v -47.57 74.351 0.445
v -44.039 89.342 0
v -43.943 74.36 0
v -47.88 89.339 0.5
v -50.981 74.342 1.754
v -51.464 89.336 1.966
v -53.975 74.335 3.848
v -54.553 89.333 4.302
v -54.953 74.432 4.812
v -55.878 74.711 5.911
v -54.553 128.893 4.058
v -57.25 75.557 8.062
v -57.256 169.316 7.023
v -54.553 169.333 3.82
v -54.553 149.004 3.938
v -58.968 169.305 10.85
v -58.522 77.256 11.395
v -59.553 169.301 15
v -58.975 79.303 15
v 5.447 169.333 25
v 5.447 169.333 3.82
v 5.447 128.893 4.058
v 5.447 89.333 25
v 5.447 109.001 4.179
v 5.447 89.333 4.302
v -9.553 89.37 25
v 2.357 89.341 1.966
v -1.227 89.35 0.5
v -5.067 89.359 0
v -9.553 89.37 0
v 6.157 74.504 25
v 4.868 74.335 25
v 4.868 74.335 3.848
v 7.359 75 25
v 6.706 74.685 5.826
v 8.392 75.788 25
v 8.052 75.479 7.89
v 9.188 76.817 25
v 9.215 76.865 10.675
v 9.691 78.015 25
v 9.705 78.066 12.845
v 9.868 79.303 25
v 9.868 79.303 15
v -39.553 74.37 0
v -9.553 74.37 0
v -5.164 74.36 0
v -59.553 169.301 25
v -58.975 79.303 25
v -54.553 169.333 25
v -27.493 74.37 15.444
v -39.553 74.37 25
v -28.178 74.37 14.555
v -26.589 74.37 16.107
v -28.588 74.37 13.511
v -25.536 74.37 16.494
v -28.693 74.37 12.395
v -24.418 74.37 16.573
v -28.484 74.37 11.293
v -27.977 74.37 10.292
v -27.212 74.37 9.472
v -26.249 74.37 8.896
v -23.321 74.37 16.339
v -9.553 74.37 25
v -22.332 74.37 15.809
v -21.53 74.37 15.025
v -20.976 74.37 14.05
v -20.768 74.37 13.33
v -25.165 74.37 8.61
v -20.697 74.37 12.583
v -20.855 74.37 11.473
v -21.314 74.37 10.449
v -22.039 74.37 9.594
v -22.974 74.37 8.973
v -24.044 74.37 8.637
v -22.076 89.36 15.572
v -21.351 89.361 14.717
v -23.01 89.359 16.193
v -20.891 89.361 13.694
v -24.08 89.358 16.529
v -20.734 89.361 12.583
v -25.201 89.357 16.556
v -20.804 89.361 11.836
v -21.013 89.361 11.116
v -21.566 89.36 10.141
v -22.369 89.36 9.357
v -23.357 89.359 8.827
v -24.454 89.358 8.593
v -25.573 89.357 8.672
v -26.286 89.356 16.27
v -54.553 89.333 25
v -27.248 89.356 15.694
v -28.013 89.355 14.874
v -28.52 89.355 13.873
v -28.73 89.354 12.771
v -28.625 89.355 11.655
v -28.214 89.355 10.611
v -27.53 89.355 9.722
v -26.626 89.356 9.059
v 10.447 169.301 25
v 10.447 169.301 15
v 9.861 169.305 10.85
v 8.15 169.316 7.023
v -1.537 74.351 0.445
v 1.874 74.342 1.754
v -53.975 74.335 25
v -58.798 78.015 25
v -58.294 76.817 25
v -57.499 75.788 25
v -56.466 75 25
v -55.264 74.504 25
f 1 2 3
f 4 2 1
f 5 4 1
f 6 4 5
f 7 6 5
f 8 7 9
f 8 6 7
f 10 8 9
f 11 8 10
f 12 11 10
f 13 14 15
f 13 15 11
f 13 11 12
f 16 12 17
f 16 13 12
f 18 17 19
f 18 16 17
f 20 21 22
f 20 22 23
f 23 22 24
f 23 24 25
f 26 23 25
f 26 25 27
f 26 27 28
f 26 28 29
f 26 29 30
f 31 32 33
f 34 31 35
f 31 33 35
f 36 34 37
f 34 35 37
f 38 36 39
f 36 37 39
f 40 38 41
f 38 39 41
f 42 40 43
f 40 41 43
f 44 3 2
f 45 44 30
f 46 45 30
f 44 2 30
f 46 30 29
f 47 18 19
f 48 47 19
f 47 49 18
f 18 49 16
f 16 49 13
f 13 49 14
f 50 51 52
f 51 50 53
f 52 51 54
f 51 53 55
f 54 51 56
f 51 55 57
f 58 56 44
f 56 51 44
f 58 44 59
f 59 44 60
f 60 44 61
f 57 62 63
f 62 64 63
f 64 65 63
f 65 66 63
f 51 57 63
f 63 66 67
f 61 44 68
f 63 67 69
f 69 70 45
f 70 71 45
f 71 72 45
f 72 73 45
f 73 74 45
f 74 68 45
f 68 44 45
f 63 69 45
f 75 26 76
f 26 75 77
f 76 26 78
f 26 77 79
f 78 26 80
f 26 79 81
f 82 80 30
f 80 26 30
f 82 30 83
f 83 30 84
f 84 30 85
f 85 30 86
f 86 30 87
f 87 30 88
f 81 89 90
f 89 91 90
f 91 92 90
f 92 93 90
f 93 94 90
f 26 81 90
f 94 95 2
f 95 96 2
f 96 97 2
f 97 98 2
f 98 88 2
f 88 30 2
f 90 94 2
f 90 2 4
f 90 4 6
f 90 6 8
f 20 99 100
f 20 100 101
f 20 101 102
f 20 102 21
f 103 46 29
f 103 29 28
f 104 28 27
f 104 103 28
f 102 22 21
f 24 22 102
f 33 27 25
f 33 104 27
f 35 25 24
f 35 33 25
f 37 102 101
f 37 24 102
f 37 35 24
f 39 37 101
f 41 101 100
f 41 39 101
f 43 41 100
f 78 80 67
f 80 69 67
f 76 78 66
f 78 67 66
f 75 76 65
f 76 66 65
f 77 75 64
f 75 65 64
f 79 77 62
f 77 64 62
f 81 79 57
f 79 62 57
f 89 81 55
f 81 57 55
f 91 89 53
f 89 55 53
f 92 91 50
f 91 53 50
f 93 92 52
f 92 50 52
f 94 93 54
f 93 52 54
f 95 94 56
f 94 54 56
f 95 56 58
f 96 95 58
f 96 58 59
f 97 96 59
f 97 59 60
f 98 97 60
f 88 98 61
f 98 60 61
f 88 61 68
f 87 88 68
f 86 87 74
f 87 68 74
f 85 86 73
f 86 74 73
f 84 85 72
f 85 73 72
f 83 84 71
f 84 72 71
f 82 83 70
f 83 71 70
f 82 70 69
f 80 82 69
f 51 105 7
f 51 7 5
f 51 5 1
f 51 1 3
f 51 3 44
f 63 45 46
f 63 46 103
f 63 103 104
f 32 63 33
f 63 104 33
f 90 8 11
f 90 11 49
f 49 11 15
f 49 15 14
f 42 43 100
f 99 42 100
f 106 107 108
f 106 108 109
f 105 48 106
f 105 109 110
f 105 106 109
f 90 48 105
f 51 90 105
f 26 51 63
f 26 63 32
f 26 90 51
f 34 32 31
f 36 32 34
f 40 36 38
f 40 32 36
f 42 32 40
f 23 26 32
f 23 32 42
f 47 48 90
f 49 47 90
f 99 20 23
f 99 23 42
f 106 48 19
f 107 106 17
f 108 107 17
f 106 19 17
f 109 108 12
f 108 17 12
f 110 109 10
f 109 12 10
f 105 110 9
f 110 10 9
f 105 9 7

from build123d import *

# Parameters (mm, degrees)
F1_DEPTH    = 25
F2_R        = 4
F3_DEPTH    = 17.8
F4_DEPTH    = 25
F5_T1_DEPTH = 165
F6_T1_DEPTH = 165


# Not quite as in the source:
# - a fillet or chamfer that OpenCascade refuses, or shapes differently, is made with other operations: its cross-section is extruded or revolved along the edge and cut away or added


with BuildPart() as f1:
    # F0 (on Top) → F1 (new body)
    with BuildSketch(Plane.XY):
        with BuildLine():
            ThreePointArc((4.8683269703, 74.3350517786), (8.3924837429, 75.788177233), (9.8682237508, 79.3029241619))
            Line((9.8682237508, 79.3029241619), (10.446520851, 169.3010662119))
            Line((10.446520851, 169.3010662119), (5.4466240705, 169.3331938286))
            Line((5.4466240705, 169.3331938286), (5.4466240705, 89.3331938286))
            Line((5.4466240705, 89.3331938286), (-9.5533759295, 89.3702277541))
            Line((-9.5533759295, 89.3702277541), (-54.5533759295, 89.3331938286))
            Line((-54.5533759295, 89.3331938286), (-54.5533759295, 169.3331938286))
            Line((-54.5533759295, 169.3331938286), (-59.5532727101, 169.3010662119))
            Line((-59.5532727101, 169.3010662119), (-58.9749756099, 79.3029241619))
            ThreePointArc((-58.9749756099, 79.3029241619), (-57.499235602, 75.788177233), (-53.9750788293, 74.3350517786))
            Line((-53.9750788293, 74.3350517786), (-39.5533759295, 74.3702277541))
            Line((-39.5533759295, 74.3702277541), (-9.5533759295, 74.3702277541))
            Line((-9.5533759295, 74.3702277541), (4.8683269703, 74.3350517786))
        make_face()
    extrude(amount=F1_DEPTH)

    # F2 (on face) → F3 (cut)
    with BuildSketch(Plane(origin=(-0.1816306533, 74.4662593781, 0), x_dir=(0.9999970254, 0.0024390927, 0), z_dir=(0.0024390927, -0.9999970254, 0))):
        with Locations((-24.5160218328, 12.5830201432)):
            Circle(F2_R)
    extrude(amount=-F3_DEPTH, mode=Mode.SUBTRACT)

    # F4 (cut): a face of the model
    f4_faces = [f1.faces().sort_by_distance(p)[0] for p in [
        (-24.697579561, 74.4064625271, 12.5830201432),
    ]]
    extrude(f4_faces, amount=-F4_DEPTH, mode=Mode.SUBTRACT)

    # F5: fillet of radius 15 on 1 edges, made by hand

    # F5_s2 → F5_t1 (cut)
    with BuildSketch(Plane(origin=(0.2690025781, 41.8638312931, 0), x_dir=(0, 0, 1), z_dir=(0.0064255233, 0.9999793561, 0))):
        with BuildLine():
            ThreePointArc((0, -5.6415427574), (4.3933982822, 4.9650589604), (15, 9.3584572426))
            Line((15, 9.3584572426), (0, 9.3584572426))
            Line((0, 9.3584572426), (0, -5.6415427574))
        make_face()
    extrude(amount=F5_T1_DEPTH, mode=Mode.SUBTRACT)

    # F6: fillet of radius 15 on 1 edges, made by hand

    # F6_s2 → F6_t1 (cut)
    with BuildSketch(Plane(origin=(-1.3312414161, 207.1759551176, 0), x_dir=(0, 0, 1), z_dir=(0.0064255233, -0.9999793561, 0))):
        with BuildLine():
            ThreePointArc((0, 43.4641953473), (4.3933982822, 54.0707970651), (15, 58.4641953473))
            Line((15, 58.4641953473), (0, 58.4641953473))
            Line((0, 58.4641953473), (0, 43.4641953473))
        make_face()
    extrude(amount=F6_T1_DEPTH, mode=Mode.SUBTRACT)


solid = f1.part
